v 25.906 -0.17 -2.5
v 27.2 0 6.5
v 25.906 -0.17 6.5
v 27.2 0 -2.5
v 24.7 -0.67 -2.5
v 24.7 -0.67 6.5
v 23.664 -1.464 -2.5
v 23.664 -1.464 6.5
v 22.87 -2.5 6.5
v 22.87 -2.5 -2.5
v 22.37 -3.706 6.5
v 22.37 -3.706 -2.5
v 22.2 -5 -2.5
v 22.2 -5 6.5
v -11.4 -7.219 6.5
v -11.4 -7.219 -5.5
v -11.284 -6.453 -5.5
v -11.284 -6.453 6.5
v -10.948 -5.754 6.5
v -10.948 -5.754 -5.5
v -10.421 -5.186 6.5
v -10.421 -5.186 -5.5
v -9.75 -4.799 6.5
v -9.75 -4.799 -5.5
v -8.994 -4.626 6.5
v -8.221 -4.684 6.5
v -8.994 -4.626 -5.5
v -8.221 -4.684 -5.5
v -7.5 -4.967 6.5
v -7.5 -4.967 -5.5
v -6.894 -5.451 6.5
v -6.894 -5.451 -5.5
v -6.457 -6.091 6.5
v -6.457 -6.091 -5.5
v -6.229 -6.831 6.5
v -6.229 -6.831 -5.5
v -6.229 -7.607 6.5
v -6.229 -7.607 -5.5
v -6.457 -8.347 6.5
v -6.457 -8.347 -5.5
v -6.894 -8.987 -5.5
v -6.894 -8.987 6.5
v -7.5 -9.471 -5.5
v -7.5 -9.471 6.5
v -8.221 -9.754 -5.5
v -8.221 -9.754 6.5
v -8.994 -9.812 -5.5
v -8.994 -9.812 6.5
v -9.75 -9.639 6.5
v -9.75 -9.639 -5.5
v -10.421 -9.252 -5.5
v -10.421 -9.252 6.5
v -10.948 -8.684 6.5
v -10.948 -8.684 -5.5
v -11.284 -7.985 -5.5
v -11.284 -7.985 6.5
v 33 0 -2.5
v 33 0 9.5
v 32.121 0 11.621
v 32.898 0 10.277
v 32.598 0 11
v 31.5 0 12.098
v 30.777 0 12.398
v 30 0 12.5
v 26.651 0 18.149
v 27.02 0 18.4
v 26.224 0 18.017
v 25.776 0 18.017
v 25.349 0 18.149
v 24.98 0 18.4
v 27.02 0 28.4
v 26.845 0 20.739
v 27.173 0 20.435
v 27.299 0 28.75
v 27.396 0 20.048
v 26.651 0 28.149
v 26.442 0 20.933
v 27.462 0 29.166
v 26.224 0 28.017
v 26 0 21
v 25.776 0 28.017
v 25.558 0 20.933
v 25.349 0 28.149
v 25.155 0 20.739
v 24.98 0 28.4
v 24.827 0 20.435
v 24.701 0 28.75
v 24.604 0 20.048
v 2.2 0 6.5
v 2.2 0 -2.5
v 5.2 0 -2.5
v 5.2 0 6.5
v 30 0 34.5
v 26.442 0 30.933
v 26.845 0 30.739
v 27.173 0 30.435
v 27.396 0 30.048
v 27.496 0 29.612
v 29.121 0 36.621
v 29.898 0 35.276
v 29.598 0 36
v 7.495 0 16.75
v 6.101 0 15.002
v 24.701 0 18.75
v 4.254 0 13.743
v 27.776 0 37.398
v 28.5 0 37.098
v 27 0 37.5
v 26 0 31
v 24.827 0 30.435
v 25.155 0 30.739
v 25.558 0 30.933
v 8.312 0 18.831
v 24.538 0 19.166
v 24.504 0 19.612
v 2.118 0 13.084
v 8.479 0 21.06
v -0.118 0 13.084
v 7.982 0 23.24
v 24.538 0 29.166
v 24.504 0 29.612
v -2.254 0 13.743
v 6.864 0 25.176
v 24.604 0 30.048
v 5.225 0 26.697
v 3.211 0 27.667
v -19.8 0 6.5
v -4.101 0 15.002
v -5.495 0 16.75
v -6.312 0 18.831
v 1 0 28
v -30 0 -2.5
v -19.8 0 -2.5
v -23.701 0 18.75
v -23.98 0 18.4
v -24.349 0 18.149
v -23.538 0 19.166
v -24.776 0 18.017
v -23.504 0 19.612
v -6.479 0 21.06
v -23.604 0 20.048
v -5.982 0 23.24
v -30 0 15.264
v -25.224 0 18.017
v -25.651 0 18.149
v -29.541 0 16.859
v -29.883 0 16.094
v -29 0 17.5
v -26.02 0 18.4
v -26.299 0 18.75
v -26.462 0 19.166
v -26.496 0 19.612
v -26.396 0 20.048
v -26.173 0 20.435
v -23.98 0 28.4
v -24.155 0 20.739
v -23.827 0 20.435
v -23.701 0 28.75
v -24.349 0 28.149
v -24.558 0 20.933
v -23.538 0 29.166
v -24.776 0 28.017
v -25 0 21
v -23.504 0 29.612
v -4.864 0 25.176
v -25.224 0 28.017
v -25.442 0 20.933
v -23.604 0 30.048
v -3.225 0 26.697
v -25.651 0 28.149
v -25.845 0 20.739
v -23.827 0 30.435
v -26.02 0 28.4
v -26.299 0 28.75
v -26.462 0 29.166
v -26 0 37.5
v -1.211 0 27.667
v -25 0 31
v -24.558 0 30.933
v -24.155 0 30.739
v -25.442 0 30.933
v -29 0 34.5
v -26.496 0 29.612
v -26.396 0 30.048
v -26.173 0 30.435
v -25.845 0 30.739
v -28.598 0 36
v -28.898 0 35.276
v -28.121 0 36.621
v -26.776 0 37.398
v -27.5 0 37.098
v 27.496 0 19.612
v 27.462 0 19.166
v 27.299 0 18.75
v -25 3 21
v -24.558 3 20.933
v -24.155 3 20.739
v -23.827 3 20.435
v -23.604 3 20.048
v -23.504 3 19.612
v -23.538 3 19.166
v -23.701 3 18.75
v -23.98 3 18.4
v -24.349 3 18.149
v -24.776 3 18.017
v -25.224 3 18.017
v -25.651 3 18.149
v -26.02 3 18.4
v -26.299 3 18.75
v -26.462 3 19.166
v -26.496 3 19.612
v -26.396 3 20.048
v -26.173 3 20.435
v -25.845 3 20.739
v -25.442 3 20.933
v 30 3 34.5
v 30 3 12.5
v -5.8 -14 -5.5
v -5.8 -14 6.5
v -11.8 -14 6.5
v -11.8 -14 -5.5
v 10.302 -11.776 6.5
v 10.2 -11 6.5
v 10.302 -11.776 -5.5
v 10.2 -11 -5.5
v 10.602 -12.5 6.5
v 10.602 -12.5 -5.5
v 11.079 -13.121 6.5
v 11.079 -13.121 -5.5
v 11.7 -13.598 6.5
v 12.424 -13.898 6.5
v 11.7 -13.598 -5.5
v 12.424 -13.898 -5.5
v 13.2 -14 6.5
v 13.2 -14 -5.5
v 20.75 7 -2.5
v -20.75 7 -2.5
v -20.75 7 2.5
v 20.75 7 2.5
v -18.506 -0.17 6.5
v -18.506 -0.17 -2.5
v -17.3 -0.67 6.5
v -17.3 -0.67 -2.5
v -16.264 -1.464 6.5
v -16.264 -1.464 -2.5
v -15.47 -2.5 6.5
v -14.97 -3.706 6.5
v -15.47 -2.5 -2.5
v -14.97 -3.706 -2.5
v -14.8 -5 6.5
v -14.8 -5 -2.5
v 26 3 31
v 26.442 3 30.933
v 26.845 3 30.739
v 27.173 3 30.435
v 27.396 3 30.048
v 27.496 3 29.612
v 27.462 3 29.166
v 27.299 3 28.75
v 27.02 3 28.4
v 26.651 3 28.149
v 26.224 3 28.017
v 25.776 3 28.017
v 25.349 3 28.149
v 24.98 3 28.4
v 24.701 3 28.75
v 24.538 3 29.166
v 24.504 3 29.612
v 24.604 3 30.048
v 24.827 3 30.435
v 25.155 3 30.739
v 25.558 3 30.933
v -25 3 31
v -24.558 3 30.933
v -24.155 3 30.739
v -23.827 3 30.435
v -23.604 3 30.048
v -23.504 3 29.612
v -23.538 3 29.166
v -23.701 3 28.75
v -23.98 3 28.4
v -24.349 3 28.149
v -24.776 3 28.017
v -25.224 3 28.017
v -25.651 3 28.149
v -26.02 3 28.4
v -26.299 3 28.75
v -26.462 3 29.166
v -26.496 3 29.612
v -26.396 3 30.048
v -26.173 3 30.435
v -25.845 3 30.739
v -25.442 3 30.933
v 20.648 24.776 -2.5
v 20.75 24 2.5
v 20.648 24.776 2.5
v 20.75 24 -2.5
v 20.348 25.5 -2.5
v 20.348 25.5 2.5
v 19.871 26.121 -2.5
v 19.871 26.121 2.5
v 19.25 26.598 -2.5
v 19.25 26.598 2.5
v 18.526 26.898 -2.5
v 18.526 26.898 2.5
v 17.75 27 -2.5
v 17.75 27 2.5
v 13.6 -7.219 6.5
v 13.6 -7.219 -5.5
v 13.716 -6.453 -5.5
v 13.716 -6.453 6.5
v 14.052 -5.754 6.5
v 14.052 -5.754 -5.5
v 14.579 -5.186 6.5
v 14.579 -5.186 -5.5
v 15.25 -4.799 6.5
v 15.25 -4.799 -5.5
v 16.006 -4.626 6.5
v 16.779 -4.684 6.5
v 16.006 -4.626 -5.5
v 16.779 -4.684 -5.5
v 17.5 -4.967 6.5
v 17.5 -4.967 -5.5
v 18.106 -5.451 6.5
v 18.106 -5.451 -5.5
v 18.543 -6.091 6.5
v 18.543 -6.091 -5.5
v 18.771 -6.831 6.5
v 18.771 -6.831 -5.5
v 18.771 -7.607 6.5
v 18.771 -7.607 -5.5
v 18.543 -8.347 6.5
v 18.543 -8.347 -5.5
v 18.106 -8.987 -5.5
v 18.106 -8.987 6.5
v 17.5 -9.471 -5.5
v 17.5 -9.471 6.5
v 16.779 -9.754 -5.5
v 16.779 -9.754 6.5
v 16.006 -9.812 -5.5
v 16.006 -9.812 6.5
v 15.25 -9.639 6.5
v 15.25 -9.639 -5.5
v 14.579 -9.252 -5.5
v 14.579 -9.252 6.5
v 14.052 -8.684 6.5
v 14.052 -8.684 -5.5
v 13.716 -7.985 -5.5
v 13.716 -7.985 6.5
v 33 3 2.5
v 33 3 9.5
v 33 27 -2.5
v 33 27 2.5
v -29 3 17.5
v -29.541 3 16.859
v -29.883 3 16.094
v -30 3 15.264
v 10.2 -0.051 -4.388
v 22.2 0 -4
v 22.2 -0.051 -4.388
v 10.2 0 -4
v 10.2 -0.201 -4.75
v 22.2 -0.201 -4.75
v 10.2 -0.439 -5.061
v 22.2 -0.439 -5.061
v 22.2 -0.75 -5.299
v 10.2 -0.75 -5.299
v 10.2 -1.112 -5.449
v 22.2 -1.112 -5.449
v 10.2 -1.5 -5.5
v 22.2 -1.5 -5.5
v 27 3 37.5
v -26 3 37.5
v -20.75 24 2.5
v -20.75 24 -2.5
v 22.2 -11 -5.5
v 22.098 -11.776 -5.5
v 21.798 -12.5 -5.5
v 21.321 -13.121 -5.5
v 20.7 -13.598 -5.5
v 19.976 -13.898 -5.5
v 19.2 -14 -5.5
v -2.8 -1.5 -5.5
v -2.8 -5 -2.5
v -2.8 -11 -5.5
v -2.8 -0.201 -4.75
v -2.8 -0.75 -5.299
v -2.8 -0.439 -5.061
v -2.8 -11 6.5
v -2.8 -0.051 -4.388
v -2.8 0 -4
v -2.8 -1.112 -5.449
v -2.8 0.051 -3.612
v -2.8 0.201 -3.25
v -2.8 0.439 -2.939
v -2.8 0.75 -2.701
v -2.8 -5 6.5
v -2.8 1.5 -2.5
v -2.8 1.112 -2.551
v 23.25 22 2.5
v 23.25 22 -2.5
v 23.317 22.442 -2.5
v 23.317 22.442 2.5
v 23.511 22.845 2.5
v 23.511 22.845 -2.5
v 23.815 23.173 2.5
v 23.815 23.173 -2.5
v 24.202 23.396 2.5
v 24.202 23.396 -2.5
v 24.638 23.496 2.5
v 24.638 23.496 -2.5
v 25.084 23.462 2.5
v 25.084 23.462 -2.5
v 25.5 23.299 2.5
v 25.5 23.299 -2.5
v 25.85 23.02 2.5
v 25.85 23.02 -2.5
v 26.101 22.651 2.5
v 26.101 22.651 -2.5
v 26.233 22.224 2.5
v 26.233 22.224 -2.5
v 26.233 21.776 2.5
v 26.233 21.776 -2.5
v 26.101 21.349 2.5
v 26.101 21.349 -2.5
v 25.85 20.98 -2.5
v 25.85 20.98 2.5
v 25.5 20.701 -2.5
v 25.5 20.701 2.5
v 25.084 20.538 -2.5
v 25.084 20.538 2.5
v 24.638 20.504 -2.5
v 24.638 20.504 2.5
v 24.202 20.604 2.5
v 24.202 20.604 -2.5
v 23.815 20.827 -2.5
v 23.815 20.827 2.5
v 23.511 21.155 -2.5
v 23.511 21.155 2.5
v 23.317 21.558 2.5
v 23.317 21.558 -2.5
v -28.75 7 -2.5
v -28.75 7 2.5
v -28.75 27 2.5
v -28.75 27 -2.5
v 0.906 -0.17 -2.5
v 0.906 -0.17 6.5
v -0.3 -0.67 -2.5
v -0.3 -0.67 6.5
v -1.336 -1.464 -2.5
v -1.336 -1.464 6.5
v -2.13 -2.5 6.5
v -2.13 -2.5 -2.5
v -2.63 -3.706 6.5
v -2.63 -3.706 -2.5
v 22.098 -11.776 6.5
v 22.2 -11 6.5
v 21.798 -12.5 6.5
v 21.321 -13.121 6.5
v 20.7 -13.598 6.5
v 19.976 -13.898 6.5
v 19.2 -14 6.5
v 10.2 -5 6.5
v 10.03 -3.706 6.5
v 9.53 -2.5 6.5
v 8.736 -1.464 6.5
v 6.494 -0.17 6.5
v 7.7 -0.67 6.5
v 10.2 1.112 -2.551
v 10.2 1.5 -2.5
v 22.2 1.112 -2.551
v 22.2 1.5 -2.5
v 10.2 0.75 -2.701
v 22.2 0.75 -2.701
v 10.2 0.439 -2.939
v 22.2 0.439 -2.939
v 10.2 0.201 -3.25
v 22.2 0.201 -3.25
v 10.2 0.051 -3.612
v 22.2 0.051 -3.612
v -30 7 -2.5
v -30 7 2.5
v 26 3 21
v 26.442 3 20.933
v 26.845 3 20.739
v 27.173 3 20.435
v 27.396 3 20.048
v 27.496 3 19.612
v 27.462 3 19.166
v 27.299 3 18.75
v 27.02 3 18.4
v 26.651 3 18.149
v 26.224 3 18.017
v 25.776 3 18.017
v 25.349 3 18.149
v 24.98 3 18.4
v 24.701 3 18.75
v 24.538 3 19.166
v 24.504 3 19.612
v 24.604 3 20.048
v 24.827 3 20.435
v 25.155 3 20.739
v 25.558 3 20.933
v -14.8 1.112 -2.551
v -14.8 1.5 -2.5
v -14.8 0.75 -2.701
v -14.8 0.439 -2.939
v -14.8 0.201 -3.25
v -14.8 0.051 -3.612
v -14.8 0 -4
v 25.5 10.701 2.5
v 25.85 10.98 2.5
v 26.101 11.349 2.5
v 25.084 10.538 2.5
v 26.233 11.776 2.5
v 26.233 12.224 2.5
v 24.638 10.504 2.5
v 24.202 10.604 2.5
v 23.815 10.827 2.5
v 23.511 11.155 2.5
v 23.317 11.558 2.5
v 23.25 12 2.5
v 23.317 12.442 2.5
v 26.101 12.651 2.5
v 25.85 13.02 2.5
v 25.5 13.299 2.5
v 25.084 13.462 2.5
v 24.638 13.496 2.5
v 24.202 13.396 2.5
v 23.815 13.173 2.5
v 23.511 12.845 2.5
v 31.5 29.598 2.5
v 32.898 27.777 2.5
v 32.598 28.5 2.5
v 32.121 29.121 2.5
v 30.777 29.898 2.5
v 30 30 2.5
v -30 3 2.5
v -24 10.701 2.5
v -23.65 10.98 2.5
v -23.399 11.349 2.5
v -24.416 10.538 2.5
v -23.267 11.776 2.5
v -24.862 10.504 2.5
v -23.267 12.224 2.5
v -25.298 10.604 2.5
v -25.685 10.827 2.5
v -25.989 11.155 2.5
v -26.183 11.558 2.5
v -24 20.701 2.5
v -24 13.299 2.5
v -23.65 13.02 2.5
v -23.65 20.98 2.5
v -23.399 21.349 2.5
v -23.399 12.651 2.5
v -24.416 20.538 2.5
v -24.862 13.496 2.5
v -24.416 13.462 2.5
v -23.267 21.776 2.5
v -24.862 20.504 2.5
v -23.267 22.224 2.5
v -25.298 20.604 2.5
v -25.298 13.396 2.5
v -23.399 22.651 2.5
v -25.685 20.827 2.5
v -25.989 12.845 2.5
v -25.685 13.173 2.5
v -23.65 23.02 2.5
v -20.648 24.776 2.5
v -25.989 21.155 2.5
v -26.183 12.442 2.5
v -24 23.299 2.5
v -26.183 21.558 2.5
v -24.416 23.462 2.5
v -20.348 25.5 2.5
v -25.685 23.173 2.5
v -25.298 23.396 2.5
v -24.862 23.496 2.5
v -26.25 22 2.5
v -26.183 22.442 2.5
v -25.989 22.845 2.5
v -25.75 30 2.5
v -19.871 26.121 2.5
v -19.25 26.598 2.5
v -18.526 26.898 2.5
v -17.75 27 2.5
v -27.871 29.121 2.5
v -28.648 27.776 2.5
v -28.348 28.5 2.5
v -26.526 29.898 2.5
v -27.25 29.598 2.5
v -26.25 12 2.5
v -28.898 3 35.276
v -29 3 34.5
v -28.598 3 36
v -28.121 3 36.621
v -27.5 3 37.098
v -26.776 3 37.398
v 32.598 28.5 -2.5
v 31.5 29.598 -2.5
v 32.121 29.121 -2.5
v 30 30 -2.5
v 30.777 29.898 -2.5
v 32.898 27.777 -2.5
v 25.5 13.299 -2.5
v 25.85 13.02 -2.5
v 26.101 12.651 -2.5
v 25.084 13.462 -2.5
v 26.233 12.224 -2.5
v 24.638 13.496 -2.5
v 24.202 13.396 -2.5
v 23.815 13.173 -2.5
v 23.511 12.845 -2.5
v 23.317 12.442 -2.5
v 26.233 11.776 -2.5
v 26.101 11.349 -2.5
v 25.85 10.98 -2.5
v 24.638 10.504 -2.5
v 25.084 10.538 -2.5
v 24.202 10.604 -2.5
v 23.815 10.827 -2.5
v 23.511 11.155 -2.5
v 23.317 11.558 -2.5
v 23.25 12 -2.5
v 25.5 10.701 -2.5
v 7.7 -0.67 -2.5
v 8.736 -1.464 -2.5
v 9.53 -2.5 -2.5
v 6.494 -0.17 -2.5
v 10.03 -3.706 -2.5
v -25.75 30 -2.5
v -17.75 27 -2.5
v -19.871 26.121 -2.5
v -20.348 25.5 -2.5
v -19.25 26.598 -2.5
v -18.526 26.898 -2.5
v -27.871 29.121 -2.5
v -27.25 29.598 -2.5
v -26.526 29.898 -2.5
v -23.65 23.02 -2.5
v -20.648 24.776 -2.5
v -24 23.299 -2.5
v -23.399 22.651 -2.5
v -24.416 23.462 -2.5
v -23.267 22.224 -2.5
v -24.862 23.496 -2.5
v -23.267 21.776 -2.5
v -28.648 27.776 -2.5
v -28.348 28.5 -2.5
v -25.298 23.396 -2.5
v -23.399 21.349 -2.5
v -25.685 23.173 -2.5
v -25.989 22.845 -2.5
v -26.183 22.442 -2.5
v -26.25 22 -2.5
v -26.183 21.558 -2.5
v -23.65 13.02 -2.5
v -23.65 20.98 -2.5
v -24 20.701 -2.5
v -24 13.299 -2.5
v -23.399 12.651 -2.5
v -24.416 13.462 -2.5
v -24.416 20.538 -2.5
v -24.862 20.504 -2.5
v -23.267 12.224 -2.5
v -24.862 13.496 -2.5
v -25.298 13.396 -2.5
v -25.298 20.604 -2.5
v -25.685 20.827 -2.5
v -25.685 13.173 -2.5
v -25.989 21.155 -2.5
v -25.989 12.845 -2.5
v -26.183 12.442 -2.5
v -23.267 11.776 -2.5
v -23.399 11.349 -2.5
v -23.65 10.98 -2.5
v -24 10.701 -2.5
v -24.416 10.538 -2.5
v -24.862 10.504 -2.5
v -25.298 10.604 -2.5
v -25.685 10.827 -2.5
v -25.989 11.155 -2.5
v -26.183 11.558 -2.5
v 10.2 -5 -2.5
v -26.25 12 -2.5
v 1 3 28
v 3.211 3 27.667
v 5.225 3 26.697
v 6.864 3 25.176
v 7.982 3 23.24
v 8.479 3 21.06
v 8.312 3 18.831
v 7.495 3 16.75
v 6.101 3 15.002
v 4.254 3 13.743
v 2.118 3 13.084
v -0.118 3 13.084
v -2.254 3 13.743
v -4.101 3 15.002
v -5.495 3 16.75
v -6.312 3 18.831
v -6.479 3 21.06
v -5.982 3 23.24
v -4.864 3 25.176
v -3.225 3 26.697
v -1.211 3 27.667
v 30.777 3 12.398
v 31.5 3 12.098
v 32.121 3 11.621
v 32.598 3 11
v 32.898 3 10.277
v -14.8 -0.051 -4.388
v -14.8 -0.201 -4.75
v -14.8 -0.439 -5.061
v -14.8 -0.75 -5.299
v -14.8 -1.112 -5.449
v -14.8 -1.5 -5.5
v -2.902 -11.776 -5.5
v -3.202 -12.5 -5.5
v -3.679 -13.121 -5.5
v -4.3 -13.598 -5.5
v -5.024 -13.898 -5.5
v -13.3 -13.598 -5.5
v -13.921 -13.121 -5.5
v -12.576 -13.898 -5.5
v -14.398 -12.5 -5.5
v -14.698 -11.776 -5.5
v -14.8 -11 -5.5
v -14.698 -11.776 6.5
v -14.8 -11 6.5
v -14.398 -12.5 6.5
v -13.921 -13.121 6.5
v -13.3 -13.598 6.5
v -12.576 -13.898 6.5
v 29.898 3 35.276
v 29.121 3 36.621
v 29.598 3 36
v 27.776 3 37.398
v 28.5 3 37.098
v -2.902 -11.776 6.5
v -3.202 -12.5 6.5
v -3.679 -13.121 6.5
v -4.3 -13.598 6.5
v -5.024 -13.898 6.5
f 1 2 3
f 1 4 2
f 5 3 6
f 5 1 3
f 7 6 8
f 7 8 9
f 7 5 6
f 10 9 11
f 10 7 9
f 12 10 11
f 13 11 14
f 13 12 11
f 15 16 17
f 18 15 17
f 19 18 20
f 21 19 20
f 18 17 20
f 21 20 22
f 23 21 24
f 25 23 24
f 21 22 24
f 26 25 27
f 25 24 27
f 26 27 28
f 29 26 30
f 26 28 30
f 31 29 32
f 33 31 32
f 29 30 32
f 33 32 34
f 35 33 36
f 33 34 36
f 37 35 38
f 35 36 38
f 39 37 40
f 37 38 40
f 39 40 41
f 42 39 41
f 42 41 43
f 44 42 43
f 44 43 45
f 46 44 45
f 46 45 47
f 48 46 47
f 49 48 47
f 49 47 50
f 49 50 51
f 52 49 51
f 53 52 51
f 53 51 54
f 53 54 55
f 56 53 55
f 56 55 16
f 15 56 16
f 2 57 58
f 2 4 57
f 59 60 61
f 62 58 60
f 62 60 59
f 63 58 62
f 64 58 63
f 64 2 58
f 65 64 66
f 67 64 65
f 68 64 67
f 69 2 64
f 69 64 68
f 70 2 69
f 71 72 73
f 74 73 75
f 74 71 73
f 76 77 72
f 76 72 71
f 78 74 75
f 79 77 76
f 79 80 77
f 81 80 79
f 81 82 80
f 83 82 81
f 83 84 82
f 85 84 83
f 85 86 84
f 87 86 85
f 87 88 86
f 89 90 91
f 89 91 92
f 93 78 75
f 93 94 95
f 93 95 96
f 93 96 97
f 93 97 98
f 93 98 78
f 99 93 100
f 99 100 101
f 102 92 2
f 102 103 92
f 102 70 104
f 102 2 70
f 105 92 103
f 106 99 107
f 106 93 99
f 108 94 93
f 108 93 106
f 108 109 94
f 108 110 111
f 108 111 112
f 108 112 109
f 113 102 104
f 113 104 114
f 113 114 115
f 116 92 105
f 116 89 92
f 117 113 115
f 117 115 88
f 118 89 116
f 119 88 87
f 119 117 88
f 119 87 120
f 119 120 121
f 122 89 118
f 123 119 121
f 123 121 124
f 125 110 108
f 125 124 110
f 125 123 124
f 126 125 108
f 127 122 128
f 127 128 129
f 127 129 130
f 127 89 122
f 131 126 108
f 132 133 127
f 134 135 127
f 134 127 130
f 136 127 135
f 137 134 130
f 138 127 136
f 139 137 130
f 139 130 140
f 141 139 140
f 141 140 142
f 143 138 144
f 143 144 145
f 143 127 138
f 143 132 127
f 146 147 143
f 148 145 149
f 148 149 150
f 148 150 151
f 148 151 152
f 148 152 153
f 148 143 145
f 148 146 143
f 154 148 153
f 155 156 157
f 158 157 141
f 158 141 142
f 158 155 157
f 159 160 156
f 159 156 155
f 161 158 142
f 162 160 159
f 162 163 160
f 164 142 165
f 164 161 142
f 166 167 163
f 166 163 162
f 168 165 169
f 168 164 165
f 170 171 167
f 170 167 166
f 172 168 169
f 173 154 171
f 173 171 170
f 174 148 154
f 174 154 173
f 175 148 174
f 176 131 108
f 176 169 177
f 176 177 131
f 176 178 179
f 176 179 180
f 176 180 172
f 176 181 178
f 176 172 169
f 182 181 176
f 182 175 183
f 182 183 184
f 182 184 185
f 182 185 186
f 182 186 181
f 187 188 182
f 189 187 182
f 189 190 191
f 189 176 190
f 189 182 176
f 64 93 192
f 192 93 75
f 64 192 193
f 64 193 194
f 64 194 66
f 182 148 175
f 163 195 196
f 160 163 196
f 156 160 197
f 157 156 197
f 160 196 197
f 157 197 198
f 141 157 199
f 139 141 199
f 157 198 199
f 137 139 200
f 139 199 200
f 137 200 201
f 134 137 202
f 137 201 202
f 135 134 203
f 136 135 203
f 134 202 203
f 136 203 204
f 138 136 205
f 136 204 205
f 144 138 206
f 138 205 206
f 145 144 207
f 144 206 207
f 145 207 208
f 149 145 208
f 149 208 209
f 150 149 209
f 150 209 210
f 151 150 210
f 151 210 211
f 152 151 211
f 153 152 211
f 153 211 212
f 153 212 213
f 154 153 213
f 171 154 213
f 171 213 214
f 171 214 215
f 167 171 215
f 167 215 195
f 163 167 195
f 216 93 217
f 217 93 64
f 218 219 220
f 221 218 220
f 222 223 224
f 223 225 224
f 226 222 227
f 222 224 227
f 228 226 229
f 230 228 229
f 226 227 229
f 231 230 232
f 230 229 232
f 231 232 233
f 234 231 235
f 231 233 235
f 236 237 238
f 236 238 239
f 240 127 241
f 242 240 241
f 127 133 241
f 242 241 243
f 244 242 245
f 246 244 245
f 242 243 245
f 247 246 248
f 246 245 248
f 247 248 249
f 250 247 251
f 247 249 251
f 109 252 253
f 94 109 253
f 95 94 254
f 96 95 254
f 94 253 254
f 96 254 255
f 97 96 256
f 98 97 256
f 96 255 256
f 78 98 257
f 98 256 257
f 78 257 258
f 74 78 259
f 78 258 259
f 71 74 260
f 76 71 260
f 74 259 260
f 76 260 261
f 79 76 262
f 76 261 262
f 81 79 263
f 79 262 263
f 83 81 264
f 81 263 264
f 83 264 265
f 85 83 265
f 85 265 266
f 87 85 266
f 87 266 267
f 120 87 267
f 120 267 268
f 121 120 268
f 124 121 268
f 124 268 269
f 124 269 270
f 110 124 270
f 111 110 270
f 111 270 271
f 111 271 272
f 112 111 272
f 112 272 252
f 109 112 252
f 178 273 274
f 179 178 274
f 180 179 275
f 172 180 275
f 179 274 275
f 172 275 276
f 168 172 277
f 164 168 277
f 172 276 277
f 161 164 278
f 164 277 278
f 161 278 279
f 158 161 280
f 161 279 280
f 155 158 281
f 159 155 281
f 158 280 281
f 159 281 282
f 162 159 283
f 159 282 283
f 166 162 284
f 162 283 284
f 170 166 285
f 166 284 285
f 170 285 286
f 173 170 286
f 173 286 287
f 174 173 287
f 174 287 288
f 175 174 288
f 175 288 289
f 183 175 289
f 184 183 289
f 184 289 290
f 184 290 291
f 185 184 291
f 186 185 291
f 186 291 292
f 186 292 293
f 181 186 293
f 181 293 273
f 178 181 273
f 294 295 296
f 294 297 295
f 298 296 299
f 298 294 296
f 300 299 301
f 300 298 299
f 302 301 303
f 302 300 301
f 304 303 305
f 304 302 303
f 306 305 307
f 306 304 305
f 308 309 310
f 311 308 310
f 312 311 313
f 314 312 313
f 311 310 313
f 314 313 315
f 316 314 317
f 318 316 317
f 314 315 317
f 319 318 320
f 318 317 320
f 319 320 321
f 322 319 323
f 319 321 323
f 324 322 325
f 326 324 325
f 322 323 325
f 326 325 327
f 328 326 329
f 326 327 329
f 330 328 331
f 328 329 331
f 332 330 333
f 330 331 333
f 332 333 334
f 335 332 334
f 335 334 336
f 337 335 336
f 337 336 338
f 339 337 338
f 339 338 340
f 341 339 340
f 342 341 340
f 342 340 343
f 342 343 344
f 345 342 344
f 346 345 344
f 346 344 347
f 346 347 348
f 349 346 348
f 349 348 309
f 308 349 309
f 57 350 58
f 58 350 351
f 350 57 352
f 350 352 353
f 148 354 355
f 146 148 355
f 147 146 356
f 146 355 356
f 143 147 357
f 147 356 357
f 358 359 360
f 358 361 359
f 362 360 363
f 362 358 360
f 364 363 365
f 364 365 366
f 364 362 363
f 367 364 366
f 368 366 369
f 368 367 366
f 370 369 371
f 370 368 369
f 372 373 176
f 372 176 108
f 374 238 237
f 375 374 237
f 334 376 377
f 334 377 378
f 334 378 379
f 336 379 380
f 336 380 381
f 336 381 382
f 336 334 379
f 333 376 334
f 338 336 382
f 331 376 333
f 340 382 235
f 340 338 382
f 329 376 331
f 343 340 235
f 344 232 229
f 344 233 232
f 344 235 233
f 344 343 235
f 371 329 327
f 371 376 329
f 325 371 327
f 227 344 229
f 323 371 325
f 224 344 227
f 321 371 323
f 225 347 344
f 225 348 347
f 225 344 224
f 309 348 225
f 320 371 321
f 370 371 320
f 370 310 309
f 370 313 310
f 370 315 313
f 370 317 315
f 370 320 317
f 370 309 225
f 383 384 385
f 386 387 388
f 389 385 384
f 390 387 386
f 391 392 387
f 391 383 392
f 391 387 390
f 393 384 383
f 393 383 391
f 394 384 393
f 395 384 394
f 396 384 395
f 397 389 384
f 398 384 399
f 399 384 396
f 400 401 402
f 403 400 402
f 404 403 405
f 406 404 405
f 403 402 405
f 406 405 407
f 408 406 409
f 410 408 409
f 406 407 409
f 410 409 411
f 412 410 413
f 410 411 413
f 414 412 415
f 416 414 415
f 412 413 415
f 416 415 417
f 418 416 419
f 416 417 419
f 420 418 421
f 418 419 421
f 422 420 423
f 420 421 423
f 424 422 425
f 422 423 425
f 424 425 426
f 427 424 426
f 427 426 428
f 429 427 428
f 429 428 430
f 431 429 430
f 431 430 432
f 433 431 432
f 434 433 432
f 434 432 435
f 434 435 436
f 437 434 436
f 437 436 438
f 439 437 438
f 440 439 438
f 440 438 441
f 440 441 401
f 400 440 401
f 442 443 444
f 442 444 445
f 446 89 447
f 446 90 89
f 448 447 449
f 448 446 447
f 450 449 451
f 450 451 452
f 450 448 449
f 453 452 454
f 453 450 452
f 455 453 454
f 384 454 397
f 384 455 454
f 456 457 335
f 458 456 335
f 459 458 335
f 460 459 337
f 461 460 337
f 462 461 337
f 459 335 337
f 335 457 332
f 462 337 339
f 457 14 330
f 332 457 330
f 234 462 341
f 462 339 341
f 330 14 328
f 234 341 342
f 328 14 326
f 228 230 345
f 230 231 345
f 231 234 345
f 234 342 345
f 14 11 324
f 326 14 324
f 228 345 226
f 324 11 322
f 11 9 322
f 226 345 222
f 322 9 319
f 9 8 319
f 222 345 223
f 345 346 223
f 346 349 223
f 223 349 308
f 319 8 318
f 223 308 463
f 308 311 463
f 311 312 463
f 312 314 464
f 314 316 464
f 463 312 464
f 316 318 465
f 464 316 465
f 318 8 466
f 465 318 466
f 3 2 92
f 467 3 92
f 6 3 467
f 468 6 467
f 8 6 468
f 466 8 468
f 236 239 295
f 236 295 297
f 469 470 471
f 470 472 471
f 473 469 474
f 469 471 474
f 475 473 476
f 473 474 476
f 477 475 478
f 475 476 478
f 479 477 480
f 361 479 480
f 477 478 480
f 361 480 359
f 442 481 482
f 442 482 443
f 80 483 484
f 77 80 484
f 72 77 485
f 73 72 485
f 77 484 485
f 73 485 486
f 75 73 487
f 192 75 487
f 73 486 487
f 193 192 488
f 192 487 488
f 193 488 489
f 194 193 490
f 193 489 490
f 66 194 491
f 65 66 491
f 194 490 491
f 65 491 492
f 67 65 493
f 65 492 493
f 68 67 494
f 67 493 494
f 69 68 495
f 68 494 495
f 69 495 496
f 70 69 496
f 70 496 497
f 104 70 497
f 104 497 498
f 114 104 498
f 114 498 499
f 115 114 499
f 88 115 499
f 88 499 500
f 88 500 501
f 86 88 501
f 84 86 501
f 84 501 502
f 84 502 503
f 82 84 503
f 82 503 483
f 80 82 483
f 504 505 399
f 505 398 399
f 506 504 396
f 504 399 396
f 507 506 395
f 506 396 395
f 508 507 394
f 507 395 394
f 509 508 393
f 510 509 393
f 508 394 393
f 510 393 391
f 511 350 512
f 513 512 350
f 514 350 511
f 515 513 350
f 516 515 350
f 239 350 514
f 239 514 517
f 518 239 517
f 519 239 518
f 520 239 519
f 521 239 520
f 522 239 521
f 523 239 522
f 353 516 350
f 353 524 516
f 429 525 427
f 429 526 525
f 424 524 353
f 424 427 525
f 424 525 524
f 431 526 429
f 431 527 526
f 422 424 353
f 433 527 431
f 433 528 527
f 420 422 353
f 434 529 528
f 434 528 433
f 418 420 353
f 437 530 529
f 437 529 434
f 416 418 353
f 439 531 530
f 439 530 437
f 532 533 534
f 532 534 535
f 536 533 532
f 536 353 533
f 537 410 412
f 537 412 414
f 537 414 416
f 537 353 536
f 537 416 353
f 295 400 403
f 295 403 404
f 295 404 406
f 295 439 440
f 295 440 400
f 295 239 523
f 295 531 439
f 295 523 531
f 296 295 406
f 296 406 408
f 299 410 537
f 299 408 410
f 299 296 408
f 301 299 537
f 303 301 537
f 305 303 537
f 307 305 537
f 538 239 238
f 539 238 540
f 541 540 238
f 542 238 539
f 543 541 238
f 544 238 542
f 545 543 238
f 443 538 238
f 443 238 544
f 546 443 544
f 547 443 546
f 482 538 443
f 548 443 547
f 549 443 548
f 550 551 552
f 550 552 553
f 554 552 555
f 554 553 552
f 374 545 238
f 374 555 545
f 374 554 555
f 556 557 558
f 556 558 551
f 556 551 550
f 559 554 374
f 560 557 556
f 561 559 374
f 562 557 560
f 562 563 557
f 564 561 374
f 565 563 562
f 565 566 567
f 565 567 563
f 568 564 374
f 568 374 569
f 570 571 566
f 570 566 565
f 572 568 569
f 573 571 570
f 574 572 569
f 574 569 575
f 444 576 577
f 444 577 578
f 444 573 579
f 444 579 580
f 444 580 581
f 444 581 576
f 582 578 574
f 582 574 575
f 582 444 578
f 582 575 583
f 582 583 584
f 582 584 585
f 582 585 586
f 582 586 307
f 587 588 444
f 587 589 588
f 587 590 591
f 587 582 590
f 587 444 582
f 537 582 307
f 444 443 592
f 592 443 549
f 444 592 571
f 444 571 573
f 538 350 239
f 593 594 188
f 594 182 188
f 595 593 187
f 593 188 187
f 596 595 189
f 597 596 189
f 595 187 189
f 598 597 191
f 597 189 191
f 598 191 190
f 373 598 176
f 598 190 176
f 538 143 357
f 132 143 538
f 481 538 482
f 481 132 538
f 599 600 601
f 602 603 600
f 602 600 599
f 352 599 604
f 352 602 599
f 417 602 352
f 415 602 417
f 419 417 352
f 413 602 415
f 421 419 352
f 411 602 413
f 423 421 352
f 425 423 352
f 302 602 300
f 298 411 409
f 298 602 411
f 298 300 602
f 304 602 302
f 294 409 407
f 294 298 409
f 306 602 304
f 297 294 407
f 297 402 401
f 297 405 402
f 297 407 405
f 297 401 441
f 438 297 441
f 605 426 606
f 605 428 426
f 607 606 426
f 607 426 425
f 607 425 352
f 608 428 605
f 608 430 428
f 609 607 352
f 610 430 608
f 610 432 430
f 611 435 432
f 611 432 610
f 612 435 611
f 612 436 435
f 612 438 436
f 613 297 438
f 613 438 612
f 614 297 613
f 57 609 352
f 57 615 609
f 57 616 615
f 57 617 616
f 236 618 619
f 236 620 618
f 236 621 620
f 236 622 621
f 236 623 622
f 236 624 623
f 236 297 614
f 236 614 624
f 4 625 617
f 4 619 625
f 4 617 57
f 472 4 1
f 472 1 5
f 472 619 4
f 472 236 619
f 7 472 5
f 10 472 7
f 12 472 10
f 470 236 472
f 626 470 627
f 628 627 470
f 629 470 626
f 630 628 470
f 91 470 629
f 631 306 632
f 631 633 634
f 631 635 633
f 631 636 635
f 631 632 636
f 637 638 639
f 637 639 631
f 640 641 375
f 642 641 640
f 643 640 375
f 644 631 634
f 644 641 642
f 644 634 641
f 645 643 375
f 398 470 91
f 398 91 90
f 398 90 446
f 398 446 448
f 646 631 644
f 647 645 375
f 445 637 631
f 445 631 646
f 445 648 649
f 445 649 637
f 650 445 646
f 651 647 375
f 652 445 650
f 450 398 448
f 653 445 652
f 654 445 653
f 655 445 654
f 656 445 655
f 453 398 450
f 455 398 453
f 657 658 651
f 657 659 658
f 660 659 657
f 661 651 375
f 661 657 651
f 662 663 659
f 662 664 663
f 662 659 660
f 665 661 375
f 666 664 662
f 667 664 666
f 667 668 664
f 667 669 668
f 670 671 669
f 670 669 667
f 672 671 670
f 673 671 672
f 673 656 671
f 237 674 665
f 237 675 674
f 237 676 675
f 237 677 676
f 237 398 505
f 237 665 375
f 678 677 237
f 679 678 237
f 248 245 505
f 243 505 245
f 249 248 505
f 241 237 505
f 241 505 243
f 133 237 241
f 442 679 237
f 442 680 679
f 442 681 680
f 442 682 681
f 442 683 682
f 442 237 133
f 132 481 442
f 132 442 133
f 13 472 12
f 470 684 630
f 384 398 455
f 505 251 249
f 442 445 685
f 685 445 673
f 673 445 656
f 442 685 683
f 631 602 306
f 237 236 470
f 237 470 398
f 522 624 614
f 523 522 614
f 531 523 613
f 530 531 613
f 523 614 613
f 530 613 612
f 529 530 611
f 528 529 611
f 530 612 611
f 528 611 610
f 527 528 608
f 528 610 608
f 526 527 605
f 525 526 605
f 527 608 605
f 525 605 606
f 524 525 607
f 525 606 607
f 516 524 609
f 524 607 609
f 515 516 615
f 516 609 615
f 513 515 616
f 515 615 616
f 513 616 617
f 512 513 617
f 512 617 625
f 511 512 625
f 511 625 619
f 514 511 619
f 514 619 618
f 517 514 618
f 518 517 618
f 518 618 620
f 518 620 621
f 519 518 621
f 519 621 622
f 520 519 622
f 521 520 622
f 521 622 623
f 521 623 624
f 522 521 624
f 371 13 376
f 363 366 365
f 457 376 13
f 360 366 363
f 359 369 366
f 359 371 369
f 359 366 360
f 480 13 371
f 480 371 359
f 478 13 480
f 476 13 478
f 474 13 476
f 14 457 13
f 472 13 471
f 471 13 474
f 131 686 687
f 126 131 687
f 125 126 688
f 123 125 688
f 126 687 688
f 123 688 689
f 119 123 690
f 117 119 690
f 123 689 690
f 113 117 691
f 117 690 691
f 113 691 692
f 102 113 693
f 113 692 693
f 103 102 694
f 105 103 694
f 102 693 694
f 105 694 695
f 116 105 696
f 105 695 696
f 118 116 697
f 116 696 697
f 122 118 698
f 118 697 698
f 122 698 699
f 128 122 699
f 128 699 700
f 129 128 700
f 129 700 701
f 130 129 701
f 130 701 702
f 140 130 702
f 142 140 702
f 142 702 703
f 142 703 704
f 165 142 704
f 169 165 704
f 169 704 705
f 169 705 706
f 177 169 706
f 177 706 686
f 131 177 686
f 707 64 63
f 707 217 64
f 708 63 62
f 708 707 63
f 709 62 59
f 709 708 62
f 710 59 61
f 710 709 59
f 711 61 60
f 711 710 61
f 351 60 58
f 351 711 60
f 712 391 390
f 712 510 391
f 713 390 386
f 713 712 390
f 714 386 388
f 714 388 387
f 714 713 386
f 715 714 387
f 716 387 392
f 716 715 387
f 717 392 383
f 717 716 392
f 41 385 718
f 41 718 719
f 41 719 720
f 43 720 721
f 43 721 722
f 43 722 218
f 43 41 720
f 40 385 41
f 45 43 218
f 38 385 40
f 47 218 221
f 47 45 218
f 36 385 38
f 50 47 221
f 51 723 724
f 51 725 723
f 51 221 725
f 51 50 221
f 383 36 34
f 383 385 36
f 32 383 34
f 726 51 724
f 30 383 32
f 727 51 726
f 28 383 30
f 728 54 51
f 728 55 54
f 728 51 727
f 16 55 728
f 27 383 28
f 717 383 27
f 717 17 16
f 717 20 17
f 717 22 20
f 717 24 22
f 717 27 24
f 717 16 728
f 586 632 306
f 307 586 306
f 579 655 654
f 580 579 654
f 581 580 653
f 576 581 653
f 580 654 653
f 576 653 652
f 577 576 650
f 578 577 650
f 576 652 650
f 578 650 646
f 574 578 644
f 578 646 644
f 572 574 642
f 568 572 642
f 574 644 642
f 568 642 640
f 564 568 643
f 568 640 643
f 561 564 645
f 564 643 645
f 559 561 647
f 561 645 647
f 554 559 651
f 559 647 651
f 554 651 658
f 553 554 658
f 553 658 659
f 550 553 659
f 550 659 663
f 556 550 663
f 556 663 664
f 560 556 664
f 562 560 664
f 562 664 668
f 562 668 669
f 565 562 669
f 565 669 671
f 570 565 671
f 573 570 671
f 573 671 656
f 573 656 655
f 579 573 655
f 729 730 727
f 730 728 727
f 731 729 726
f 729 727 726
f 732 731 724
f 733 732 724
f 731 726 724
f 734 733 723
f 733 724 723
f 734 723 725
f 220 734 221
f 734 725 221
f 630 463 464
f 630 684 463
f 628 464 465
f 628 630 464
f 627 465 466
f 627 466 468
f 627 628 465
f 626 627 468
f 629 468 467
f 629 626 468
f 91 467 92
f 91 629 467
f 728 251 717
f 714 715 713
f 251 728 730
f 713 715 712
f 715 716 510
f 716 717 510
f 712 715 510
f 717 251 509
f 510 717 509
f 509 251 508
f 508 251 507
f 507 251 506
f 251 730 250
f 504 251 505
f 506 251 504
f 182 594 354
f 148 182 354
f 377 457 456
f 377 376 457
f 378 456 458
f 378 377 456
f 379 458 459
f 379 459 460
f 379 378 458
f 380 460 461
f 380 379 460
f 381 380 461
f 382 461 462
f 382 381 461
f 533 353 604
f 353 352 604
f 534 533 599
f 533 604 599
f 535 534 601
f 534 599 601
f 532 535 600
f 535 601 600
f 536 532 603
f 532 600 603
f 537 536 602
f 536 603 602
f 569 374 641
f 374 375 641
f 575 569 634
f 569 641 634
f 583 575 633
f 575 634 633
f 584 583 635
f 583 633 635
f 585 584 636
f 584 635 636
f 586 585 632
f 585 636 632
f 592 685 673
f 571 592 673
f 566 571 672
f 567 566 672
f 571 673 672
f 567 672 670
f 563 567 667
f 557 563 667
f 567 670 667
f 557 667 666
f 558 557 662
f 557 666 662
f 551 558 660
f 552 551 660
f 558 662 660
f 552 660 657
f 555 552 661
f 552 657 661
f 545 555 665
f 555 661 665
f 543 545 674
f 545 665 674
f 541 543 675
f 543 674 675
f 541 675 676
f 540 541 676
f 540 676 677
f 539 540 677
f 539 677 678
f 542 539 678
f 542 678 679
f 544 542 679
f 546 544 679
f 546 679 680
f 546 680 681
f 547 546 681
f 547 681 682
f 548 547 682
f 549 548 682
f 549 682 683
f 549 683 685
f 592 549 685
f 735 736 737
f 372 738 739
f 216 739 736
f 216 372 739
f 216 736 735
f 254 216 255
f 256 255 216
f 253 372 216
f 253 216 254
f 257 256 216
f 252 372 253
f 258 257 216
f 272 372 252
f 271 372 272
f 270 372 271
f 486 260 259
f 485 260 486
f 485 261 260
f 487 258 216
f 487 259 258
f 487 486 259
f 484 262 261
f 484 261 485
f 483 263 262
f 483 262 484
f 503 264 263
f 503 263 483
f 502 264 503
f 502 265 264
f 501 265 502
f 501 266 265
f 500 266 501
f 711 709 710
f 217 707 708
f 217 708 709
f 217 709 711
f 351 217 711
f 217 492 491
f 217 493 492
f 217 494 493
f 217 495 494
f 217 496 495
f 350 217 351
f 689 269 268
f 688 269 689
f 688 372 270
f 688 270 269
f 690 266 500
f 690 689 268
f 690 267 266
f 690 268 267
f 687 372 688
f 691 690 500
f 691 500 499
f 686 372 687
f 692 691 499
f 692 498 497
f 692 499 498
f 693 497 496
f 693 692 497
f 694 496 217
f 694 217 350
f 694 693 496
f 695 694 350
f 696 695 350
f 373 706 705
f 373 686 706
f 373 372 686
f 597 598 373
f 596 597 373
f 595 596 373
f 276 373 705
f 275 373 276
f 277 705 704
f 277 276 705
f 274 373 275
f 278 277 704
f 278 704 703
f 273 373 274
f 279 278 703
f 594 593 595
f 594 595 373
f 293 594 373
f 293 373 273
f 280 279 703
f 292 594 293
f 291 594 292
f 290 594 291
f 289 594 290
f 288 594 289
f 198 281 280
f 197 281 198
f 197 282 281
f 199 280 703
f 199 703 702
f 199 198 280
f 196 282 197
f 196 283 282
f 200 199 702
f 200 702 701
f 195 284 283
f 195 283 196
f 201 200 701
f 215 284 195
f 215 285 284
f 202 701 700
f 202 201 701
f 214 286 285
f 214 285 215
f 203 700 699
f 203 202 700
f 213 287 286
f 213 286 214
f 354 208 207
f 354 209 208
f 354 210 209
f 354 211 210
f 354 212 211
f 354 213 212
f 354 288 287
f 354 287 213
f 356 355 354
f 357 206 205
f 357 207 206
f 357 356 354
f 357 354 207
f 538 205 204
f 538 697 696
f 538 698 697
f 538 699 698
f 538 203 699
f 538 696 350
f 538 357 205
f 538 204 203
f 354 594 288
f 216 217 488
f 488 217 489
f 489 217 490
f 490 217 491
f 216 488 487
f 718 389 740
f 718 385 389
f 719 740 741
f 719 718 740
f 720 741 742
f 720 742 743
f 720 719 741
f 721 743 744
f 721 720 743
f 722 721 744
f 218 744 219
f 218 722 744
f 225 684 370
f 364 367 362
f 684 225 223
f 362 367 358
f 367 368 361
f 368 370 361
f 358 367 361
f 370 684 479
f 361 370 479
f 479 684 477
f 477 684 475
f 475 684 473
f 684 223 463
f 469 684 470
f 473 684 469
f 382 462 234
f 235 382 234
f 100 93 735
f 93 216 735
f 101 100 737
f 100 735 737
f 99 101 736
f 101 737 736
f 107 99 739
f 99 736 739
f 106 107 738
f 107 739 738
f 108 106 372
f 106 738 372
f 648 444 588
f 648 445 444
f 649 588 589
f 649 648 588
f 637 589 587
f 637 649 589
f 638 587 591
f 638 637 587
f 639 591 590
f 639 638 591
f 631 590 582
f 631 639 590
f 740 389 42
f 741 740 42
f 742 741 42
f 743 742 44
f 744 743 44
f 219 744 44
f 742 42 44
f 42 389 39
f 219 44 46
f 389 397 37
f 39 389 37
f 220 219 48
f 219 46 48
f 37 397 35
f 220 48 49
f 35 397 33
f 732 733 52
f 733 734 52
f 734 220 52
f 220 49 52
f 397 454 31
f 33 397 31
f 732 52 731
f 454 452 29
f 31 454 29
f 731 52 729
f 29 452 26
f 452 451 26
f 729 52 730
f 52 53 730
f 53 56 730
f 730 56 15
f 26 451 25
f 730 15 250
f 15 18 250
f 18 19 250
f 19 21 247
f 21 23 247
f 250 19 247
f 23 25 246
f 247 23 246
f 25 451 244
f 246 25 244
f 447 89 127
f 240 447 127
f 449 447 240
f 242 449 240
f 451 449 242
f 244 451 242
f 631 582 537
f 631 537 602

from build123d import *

# Parameters (mm, degrees)
SKETCH_1_W           = 60
SKETCH_1_H           = 5
EXTRUDE_1_DEPTH      = 7
SKETCH_2_W           = 8
SKETCH_2_H           = 5
EXTRUDE_2_DEPTH      = 20
SKETCH_3_R           = 1.5
CUT_EXTRUDE_1_DEPTH  = 15
SKETCH_6_W           = 60
SKETCH_6_H           = 3
EXTRUDE_3_DEPTH      = 35
SKETCH_7_W           = 1
SKETCH_7_H           = 20
CUT_EXTRUDE_2_DEPTH  = 40
SKETCH_8_R           = 1.5
SKETCH_8_R_2         = 7.5
CUT_EXTRUDE_3_DEPTH  = 10
EXTRUDE_4_DEPTH      = 3
EXTRUDE_4_DEPTH_BACK = 9
SKETCH_9_W           = 12
SKETCH_9_H           = 14
SKETCH_9_R           = 2.5
FILLET_3_R           = 3
SKETCH_12_W          = 57.5
SKETCH_12_H          = 5
EXTRUDE_6_DEPTH      = 3
FILLET_6_R           = 3
FILLET_7_R           = 1.5
FILLET_8_R           = 5
FILLET_9_R           = 3
FILLET_10_R          = 3
SKETCH_14_W          = 1.25
SKETCH_14_H          = 5
EXTRUDE_7_DEPTH      = 23
EXTRUDE_8_DEPTH      = 3
FILLET_12_R          = 3
SKETCH_17_R          = 2.6
CUT_EXTRUDE_4_DEPTH  = 15


# Some blends are built 0.0001 mm under size
with BuildPart() as part:
    # 草图1 → 凸台-拉伸1 (new body)
    with BuildSketch(Plane(origin=(0, 0, 0), x_dir=(1, 0, 0), z_dir=(0, 1, 0))):
        Rectangle(SKETCH_1_W, SKETCH_1_H)
    extrude(amount=EXTRUDE_1_DEPTH)

    # 草图2 → 凸台-拉伸2 (add)
    with BuildSketch(Plane(origin=(0, 7, 0), x_dir=(1, 0, 0), z_dir=(0, 1, 0))):
        with Locations((24.75, 0)):
            Rectangle(SKETCH_2_W, SKETCH_2_H)
        with Locations((-24.75, 0)):
            Rectangle(SKETCH_2_W, SKETCH_2_H)
    extrude(amount=EXTRUDE_2_DEPTH)

    # 草图3 → 切除-拉伸1 (cut)
    with BuildSketch(Plane(origin=(0, 0, -2.5), x_dir=(-1, 0, 0), z_dir=(0, 0, -1))):
        with Locations((-24.75, 22)):
            Circle(SKETCH_3_R)
        with Locations((-24.75, 12)):
            Circle(SKETCH_3_R)
        with Locations((24.75, 12)):
            Circle(SKETCH_3_R)
        with Locations((24.75, 22)):
            Circle(SKETCH_3_R)
    extrude(amount=-CUT_EXTRUDE_1_DEPTH, mode=Mode.SUBTRACT)

    # 草图6 → 凸台-拉伸3 (add)
    with BuildSketch(Plane.XY.offset(2.5)):
        with Locations((0, 1.5)):
            Rectangle(SKETCH_6_W, SKETCH_6_H)
    extrude(amount=EXTRUDE_3_DEPTH)

    # 草图7 → 切除-拉伸2 (cut)
    with BuildSketch(Plane(origin=(0, 3, 0), x_dir=(1, 0, 0), z_dir=(0, 1, 0))):
        with Locations((-29.5, -27.5)):
            Rectangle(SKETCH_7_W, SKETCH_7_H)
    extrude(amount=-CUT_EXTRUDE_2_DEPTH, mode=Mode.SUBTRACT)

    # 草图8 → 切除-拉伸3 (cut)
    with BuildSketch(Plane(origin=(0, 3, 0), x_dir=(1, 0, 0), z_dir=(0, 1, 0))):
        with Locations(Location((-25, -19.5, 0), (0, 0, 270))):
            Circle(SKETCH_8_R)
        with Locations(Location((-25, -29.5, 0), (0, 0, 270))):
            Circle(SKETCH_8_R)
        with Locations(Location((26, -29.5, 0), (0, 0, 270))):
            Circle(SKETCH_8_R)
        with Locations(Location((26, -19.5, 0), (0, 0, 270))):
            Circle(SKETCH_8_R)
        with Locations(Location((1, -20.5, 0), (0, 0, 270))):
            Circle(SKETCH_8_R_2)
    extrude(amount=-CUT_EXTRUDE_3_DEPTH, mode=Mode.SUBTRACT)

    # 草图9 → 凸台-拉伸4 (add, two sides: drawn at the far end of the back side and taken through both)
    # profile 1 of 2: a face of its own
    with BuildSketch(Plane(origin=(0, 0, -2.5), x_dir=(-1, 0, 0), z_dir=(0, 0, -1)).offset(-EXTRUDE_4_DEPTH_BACK)):
        with Locations((-16.2, -7)):
            Rectangle(SKETCH_9_W, SKETCH_9_H)
        with Locations((-16.2, -7.219000805)):
            Circle(SKETCH_9_R, mode=Mode.SUBTRACT)
    # profile 2 of 2: a face of its own
    with BuildSketch(Plane(origin=(0, 0, -2.5), x_dir=(-1, 0, 0), z_dir=(0, 0, -1)).offset(-EXTRUDE_4_DEPTH_BACK)):
        with Locations((8.8, -7)):
            Rectangle(SKETCH_9_W, SKETCH_9_H)
        with Locations((8.8, -7.219000805)):
            Circle(SKETCH_9_R, mode=Mode.SUBTRACT)
    extrude(amount=EXTRUDE_4_DEPTH + EXTRUDE_4_DEPTH_BACK)

    # 圆角3
    # the kernel refuses this fillet: 3 mm, written as the material it takes off along each edge
    with BuildSketch(Plane(origin=(-30, 8.590169944, 17.5), x_dir=(0, 0, -1), z_dir=(0, -1, 0))) as fillet_3_piece_1:
        with BuildLine():
            CenterArc((2.236067977, 3), FILLET_3_R, 221.810314896, 48.189685104)
            Line((0, 1), (-0.04472136, 0.96))
            ThreePointArc((-0.04472136, 0.96), (-0.06, 0.5), (-0.06, 0))
            Line((-0.06, 0), (0, -0.06))
            Line((0, -0.06), (2.236067977, -0.06))
            Line((2.236067977, -0.06), (2.236067977, 0))
        make_face()
    extrude(amount=14.180339887, mode=Mode.SUBTRACT)

    # 草图12 → 凸台-拉伸6 (add)
    with BuildSketch(Plane(origin=(0, 27, 0), x_dir=(1, 0, 0), z_dir=(0, 1, 0))):
        Rectangle(SKETCH_12_W, SKETCH_12_H)
    extrude(amount=EXTRUDE_6_DEPTH)

    # 圆角6
    fillet_6_edges = [part.edges().sort_by_distance(p)[0] for p in [
        (-28.75, 30, 0),
        (20.75, 27, 0),
        (-20.75, 27, 0),
    ]]
    fillet(fillet_6_edges, radius=FILLET_6_R)

    # 圆角7
    fillet_7_edges = [part.edges().sort_by_distance(p)[0] for p in [
        (16.2, 0, -2.5),
        (-8.8, 0, -2.5),
    ]]
    fillet(fillet_7_edges, radius=FILLET_7_R)
    fillet_7_2_edges = [part.edges().sort_by_distance(p)[0] for p in [
        (-8.8, 0, -5.5),
        (16.2, 0, -5.5),
    ]]
    fillet(fillet_7_2_edges, radius=FILLET_7_R - 0.0001)  # a hair under: the kernel refuses the full size

    # 圆角8
    fillet_8_edges = [part.edges().sort_by_distance(p)[0] for p in [
        (22.2, 0, 2),
        (10.2, 0, 2),
        (-2.8, 0, 2),
        (-14.8, 0, 2),
    ]]
    fillet(fillet_8_edges, radius=FILLET_8_R)

    # 圆角9
    fillet_9_edges = [part.edges().sort_by_distance(p)[0] for p in [
        (22.2, -14, 0.5),
        (10.2, -14, 0.5),
        (-14.8, -14, 0.5),
        (-2.8, -14, 0.5),
    ]]
    fillet(fillet_9_edges, radius=FILLET_9_R)

    # 圆角10
    fillet_10_edges = [part.edges().sort_by_distance(p)[0] for p in [
        (30, 1.5, 37.5),
        (-29, 1.5, 37.5),
    ]]
    fillet(fillet_10_edges, radius=FILLET_10_R)

    # 草图14 → 凸台-拉伸7 (add)
    with BuildSketch(Plane(origin=(0, 7, 0), x_dir=(1, 0, 0), z_dir=(0, 1, 0))):
        with Locations((29.375, 0)):
            Rectangle(SKETCH_14_W, SKETCH_14_H)
    extrude(amount=EXTRUDE_7_DEPTH)

    # 草图16 → 凸台-拉伸8 (add)
    with BuildSketch(Plane(origin=(30, 0, 0), x_dir=(0, 0, -1), z_dir=(1, 0, 0))):
        Polygon((-12.5, 0), (-12.5, 3), (-2.5, 3), (-2.5, 30), (2.5, 30), (2.5, 0), align=None)
    extrude(amount=EXTRUDE_8_DEPTH)

    # 圆角12
    fillet_12_edges = [part.edges().sort_by_distance(p)[0] for p in [
        (33, 1.5, 12.5),
        (33, 30, 0),
    ]]
    fillet(fillet_12_edges, radius=FILLET_12_R - 0.0001)  # a hair under: the kernel refuses the full size

    # 草图17 → 切除-拉伸4 (cut)
    with BuildSketch(Plane(origin=(0, 0, -5.5), x_dir=(-1, 0, 0), z_dir=(0, 0, -1))):
        with Locations((-16.2, -7.219000805)):
            Circle(SKETCH_17_R)
        with Locations((8.8, -7.219000805)):
            Circle(SKETCH_17_R)
    extrude(amount=-CUT_EXTRUDE_4_DEPTH, mode=Mode.SUBTRACT)


solid = part.part
